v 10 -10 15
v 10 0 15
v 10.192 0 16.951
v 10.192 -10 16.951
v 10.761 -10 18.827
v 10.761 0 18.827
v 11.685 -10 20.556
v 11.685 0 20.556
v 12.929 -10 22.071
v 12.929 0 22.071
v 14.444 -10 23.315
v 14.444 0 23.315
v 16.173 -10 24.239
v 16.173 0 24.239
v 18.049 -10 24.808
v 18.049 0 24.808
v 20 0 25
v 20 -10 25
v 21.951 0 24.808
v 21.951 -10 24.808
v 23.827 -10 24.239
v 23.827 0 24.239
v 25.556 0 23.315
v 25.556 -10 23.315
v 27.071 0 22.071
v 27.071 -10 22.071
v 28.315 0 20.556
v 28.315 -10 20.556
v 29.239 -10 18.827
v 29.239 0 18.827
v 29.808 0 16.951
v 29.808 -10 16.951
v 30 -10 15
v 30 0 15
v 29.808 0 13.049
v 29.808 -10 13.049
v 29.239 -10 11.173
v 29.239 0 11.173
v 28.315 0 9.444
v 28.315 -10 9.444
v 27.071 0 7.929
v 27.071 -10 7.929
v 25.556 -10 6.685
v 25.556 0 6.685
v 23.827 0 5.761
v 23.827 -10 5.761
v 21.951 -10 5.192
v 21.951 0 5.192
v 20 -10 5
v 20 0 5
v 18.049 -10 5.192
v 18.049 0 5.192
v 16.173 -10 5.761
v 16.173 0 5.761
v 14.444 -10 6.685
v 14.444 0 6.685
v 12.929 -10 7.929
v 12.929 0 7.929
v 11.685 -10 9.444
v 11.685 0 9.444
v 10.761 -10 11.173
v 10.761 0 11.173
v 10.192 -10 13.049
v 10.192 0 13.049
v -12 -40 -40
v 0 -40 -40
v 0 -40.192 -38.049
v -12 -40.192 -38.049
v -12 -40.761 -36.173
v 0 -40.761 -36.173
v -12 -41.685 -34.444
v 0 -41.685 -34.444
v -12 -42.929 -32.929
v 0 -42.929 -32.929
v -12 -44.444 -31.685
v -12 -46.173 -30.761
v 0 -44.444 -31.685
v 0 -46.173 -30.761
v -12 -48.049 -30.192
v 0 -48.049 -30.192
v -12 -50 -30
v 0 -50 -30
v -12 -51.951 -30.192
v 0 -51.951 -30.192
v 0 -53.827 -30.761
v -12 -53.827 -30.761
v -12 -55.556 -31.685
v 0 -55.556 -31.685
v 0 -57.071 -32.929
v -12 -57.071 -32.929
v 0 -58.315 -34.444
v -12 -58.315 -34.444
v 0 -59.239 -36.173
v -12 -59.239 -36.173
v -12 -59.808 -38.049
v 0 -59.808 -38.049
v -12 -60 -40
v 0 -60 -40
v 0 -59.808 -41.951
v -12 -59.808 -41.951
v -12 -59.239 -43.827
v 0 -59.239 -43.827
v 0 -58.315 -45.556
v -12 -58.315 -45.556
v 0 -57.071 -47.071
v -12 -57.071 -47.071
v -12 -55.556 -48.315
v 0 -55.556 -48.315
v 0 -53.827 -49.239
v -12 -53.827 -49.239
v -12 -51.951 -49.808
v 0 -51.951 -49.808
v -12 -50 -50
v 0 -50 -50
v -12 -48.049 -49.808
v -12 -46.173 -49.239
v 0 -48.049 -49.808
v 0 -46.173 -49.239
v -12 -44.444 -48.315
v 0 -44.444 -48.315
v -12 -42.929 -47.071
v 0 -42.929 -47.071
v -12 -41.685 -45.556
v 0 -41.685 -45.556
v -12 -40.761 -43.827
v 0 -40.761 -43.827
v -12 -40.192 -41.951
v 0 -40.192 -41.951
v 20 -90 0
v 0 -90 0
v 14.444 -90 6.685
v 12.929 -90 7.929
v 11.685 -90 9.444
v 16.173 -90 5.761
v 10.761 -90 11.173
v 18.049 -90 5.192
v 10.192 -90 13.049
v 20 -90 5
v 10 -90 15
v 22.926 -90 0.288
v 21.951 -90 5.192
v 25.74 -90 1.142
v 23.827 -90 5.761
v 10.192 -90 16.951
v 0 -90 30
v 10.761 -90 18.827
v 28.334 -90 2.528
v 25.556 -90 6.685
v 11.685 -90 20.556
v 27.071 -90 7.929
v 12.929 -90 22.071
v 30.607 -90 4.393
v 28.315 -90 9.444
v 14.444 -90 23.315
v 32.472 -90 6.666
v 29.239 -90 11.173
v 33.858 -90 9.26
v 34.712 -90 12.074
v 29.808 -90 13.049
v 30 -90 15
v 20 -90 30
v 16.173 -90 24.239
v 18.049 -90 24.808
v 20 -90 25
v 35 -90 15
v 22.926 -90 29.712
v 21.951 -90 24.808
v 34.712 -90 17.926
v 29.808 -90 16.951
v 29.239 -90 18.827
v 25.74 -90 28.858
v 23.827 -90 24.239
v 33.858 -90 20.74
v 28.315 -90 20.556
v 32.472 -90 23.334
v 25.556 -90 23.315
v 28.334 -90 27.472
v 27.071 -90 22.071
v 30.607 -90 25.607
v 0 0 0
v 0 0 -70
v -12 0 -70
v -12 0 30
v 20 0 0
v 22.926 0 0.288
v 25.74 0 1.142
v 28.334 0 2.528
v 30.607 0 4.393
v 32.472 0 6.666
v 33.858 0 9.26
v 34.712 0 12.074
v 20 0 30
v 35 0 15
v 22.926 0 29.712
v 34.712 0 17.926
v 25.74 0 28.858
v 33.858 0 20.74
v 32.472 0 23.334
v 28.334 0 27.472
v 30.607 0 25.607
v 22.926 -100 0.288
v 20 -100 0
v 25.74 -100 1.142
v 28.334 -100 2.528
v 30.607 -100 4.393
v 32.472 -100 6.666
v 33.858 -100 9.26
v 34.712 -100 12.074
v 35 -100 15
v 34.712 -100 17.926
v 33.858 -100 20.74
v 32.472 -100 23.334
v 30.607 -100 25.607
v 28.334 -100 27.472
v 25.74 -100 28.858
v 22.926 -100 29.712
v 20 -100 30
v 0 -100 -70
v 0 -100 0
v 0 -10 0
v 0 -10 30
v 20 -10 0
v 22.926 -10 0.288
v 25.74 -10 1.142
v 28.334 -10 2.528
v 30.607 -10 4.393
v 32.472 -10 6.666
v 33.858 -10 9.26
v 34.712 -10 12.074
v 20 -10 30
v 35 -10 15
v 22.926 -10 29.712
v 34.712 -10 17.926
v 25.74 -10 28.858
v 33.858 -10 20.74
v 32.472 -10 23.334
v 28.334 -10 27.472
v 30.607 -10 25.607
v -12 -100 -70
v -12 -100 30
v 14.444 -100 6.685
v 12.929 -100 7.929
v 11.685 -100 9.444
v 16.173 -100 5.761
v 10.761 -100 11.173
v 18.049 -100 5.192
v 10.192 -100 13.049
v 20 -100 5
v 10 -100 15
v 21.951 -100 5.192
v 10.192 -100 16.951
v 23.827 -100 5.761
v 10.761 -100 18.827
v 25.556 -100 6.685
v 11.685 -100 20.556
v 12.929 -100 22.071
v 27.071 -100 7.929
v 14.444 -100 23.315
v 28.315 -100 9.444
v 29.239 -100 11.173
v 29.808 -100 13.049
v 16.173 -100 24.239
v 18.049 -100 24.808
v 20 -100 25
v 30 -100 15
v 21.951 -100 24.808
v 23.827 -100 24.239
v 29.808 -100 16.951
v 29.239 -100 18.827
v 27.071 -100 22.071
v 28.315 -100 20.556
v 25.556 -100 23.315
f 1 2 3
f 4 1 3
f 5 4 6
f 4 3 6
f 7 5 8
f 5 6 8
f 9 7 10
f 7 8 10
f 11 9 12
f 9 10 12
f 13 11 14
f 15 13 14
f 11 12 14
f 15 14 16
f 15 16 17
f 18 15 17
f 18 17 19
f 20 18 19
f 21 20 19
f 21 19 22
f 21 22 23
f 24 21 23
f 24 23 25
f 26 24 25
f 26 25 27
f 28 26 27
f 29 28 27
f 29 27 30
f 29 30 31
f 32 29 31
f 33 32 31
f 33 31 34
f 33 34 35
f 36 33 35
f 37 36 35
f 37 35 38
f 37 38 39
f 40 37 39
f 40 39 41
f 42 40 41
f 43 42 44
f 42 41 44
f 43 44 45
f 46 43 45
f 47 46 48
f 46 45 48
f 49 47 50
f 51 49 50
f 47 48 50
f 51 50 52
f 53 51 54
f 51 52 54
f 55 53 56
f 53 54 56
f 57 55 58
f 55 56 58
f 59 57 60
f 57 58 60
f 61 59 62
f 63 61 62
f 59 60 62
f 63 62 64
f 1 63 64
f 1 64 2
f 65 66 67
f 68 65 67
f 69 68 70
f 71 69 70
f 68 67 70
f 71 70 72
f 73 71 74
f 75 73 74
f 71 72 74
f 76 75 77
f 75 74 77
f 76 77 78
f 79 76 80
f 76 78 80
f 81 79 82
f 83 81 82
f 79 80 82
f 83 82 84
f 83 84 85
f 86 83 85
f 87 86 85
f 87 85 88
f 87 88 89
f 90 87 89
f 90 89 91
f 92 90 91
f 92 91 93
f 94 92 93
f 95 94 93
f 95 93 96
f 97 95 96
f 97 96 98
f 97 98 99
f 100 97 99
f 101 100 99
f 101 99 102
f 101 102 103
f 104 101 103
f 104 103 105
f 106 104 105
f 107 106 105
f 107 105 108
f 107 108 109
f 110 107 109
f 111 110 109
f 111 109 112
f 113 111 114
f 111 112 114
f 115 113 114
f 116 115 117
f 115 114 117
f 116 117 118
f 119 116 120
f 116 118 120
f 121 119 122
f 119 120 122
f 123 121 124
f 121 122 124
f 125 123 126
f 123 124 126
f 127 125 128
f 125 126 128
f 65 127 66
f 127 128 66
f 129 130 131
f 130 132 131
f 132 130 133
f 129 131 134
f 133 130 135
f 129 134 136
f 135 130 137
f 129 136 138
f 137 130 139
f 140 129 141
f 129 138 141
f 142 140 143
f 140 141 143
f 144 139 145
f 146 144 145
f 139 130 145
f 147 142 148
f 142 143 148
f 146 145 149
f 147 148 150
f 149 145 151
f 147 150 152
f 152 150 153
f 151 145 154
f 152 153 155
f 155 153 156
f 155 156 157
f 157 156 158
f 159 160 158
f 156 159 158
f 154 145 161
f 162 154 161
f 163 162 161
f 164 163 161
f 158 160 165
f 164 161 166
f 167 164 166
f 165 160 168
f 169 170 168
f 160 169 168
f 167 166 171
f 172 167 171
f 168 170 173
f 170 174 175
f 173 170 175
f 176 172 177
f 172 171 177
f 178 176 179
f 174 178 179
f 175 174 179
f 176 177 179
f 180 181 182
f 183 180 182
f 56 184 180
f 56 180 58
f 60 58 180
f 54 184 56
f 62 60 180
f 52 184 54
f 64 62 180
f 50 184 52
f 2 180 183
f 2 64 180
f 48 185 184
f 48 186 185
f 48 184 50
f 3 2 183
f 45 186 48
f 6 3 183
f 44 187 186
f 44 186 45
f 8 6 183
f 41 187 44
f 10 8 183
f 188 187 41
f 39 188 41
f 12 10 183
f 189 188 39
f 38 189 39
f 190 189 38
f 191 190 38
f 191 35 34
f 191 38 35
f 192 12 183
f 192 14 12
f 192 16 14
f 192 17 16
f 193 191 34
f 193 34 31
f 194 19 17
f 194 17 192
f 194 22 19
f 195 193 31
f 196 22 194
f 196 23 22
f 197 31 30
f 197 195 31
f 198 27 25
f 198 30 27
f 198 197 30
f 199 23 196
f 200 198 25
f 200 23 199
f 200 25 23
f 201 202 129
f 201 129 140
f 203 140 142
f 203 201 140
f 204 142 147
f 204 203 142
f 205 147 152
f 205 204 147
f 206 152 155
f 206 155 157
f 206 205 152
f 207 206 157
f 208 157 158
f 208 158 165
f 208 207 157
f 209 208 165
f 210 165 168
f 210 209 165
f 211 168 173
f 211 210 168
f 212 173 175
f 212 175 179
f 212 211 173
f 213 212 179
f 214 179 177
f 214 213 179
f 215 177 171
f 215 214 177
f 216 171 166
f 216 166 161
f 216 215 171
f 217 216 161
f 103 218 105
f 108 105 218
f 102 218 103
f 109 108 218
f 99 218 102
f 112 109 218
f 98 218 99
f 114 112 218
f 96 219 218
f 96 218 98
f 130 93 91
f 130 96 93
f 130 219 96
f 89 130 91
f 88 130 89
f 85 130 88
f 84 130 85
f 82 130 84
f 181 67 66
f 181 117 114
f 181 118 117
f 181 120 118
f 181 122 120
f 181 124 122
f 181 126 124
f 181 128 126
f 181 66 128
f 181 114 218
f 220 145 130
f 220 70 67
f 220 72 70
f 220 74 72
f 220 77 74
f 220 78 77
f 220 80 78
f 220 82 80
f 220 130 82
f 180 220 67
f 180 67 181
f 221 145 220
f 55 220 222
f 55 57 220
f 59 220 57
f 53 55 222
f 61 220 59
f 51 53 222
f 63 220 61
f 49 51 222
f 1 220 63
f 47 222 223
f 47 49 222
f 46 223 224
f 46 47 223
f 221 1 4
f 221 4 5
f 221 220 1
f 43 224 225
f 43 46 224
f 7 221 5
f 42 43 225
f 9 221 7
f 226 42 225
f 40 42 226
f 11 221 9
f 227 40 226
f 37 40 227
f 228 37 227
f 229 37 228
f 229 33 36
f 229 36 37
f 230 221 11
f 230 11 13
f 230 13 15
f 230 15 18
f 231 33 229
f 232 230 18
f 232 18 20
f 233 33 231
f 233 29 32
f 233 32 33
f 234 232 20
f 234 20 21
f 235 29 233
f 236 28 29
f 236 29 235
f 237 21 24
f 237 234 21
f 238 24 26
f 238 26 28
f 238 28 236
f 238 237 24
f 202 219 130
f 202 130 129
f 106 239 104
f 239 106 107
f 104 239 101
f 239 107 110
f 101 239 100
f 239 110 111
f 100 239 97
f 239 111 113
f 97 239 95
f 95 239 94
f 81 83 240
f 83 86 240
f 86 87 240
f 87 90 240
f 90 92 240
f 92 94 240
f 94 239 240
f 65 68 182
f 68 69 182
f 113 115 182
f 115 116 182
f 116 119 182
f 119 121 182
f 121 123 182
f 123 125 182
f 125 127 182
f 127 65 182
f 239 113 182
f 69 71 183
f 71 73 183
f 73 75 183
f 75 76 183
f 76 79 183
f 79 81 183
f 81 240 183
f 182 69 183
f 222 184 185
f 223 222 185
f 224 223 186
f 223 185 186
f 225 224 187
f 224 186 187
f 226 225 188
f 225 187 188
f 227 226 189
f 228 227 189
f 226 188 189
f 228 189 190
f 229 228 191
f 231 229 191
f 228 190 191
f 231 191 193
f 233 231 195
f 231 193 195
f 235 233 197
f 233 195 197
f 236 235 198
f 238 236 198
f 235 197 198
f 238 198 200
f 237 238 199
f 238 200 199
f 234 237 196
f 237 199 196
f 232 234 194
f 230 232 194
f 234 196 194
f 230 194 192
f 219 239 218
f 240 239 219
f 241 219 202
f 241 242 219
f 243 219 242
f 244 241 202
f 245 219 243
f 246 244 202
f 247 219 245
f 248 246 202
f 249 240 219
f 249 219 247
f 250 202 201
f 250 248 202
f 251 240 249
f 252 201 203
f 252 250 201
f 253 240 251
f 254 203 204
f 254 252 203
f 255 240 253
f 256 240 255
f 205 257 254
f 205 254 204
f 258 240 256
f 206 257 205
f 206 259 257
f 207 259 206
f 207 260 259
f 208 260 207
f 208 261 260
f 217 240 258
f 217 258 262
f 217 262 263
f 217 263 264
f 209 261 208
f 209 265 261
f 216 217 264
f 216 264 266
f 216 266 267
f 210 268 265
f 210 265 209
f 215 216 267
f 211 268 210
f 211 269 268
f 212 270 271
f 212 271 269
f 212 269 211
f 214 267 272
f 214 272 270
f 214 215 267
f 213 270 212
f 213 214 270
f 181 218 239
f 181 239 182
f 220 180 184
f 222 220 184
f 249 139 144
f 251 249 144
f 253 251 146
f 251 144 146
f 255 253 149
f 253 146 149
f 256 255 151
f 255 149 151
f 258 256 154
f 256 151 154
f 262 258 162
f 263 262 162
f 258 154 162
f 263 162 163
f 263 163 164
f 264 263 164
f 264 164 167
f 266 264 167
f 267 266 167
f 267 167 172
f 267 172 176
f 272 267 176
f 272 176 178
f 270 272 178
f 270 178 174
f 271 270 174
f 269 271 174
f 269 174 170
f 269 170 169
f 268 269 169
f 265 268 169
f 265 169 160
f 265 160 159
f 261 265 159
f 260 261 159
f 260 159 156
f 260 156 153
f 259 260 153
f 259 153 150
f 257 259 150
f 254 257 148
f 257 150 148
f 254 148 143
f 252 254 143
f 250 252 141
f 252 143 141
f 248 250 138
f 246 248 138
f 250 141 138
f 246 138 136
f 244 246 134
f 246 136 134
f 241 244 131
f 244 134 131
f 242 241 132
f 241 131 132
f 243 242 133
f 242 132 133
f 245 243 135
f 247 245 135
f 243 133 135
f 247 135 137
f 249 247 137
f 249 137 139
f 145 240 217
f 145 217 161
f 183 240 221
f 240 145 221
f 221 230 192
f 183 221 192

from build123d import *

# Parameters (mm, degrees)
F1_DEPTH = 10
F2_W     = 100
F2_H     = 100
F3_DEPTH = 12
F5_DEPTH = 10
F7_D     = 20
F9_D     = 20


with BuildPart() as f1:
    # F0 (on Front) → F1 (new body)
    with BuildSketch(Plane.XZ):
        with BuildLine():
            Line((0, 30), (0, 0))
            Line((0, 0), (20, 0))
            Line((20, 0), (20, 10))
            ThreePointArc((20, 10), (15, 15), (20, 20))
            Line((20, 20), (20, 30))
            Line((20, 30), (0, 30))
        make_face()
        with BuildLine():
            Line((20, 10), (20, 0))
            ThreePointArc((20, 0), (35, 15), (20, 30))
            Line((20, 30), (20, 20))
            ThreePointArc((20, 20), (23.535534, 18.535534), (25, 15))
            ThreePointArc((25, 15), (23.535534, 11.464466), (20, 10))
        make_face()
    extrude(amount=F1_DEPTH)

    # F2 (on Right) → F3 (join)
    with BuildSketch(Plane.YZ):
        with Locations((-50, -20)):
            Rectangle(F2_W, F2_H)
    extrude(amount=-F3_DEPTH)

    # F4 (on face) → F5 (join)
    with BuildSketch(Plane.XZ.offset(100)):
        with BuildLine():
            Line((0, 30), (0, 0))
            Line((0, 0), (20, 0))
            Line((20, 0), (20, 10))
            ThreePointArc((20, 10), (15, 15), (20, 20))
            Line((20, 20), (20, 30))
            Line((20, 30), (0, 30))
        make_face()
        with BuildLine():
            Line((20, 10), (20, 0))
            ThreePointArc((20, 0), (35, 15), (20, 30))
            Line((20, 30), (20, 20))
            ThreePointArc((20, 20), (23.535534, 18.535534), (25, 15))
            ThreePointArc((25, 15), (23.535534, 11.464466), (20, 10))
        make_face()
    extrude(amount=-F5_DEPTH)

    # F7 (through all)
    with Locations(Plane(origin=(-12, 0, 0), x_dir=(0, -1, 0), z_dir=(-1, 0, 0))):
        with Locations((50, -40)):
            Hole(F7_D / 2)

    # F9 (through all)
    with Locations(Plane.XZ.offset(100)):
        with Locations((20, 15)):
            Hole(F9_D / 2)


solid = f1.part
